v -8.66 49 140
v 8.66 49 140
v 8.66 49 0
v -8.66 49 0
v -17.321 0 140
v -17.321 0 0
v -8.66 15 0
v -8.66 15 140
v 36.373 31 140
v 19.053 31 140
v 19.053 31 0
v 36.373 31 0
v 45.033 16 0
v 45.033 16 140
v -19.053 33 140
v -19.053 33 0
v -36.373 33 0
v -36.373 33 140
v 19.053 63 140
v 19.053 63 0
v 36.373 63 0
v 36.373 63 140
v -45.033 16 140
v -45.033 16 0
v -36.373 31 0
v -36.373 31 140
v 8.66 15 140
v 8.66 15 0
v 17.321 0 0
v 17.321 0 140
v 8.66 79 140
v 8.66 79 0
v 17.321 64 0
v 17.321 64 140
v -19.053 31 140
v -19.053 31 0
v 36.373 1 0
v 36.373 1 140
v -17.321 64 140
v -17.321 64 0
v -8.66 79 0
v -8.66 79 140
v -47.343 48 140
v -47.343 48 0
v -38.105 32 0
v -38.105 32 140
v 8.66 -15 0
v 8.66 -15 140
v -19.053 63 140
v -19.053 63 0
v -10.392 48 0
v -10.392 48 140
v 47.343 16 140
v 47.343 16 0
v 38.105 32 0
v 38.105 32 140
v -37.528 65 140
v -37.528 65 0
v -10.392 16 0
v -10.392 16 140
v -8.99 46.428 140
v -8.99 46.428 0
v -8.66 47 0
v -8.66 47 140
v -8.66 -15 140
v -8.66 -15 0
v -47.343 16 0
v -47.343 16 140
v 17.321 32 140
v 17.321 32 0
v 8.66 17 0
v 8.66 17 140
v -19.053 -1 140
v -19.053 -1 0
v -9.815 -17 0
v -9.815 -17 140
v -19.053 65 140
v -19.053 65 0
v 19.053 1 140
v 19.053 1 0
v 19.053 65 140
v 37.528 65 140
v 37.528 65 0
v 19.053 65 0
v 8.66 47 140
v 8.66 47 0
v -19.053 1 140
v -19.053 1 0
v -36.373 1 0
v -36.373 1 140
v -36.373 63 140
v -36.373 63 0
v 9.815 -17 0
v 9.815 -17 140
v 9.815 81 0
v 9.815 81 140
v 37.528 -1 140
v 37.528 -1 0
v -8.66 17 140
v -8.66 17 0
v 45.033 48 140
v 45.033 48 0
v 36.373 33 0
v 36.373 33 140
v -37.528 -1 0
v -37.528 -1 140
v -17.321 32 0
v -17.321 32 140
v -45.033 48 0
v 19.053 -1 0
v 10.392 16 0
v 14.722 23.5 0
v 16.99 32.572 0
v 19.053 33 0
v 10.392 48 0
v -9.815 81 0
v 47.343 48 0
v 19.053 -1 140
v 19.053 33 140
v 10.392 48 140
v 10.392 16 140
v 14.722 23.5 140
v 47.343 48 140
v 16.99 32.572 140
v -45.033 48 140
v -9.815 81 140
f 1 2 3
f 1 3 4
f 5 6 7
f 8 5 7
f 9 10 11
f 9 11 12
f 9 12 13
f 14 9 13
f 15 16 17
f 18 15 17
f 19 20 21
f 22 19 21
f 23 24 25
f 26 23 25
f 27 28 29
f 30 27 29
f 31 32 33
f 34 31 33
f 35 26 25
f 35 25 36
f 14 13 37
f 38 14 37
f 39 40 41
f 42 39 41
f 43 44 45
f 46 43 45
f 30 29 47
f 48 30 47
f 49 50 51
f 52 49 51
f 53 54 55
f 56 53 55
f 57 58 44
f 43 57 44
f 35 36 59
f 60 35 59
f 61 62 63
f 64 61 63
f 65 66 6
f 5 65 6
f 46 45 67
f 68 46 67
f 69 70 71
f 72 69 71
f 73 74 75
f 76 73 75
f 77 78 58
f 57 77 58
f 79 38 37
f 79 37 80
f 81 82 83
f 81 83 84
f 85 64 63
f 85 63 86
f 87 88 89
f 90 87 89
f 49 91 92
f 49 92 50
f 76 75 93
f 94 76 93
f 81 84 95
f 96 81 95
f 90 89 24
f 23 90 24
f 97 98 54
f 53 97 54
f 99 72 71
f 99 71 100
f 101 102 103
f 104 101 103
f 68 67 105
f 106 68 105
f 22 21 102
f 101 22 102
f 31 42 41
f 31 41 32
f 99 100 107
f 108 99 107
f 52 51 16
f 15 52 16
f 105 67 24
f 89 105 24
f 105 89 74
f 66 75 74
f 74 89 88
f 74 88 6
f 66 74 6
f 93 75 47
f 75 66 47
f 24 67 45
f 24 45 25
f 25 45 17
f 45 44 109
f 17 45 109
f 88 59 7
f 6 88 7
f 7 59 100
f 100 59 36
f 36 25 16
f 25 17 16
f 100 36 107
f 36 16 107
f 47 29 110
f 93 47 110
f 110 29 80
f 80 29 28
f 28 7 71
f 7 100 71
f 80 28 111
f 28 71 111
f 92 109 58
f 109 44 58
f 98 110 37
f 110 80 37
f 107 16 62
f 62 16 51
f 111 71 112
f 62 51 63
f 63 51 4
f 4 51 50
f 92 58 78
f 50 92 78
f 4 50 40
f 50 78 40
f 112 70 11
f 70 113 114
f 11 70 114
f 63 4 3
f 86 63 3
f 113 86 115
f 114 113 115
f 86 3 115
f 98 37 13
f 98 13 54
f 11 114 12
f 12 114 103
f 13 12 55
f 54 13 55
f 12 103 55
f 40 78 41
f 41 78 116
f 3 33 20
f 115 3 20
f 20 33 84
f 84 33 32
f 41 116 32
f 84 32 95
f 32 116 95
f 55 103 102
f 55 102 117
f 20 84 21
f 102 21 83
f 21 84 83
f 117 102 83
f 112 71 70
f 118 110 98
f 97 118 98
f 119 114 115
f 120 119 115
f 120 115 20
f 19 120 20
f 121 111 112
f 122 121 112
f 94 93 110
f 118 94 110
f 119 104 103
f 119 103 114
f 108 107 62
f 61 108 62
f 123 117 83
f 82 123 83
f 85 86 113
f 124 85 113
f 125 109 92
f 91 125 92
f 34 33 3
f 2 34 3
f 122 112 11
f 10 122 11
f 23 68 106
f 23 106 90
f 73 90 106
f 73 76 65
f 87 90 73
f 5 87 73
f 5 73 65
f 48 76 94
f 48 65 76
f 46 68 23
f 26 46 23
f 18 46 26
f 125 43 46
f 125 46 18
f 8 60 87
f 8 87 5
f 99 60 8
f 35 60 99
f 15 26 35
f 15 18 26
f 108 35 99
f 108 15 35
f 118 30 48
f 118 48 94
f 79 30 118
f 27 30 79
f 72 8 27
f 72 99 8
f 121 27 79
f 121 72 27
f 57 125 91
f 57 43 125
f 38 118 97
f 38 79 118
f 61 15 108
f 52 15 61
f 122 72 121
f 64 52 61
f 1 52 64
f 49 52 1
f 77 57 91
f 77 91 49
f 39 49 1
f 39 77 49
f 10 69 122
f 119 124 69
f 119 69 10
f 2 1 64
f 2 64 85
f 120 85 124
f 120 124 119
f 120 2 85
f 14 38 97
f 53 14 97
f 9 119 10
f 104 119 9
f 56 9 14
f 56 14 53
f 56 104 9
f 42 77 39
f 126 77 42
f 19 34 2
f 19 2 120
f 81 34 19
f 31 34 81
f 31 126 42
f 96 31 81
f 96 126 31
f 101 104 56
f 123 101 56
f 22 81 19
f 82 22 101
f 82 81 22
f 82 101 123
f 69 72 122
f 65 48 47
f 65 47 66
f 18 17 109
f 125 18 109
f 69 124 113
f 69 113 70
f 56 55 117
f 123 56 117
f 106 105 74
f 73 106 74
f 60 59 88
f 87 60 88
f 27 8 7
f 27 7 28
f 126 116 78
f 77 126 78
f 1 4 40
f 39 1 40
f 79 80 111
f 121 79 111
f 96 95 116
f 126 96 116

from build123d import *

# Parameters (mm, degrees)
F1_DEPTH = 140


# Not quite as in the source:
# - ends of sketch curves that miss each other by under 0.0002 mm in the source are joined


with BuildPart() as f1:
    # F0 (on Top) → F1 (new body)
    with BuildSketch(Plane.XY):
        Polygon((9.8149545762, -17), (19.0525588833, -1), (37.5277626519, -1), (47.3427172281, 16), (38.1051129211, 32), (47.3427172281, 48), (37.5277626519, 65), (19.0525576719, 65), (9.8149545762, 81), (-9.8149545762, 81), (-19.0525576719, 65.0000020981), (-37.5277626519, 65), (-47.3427172281, 48), (-38.1051129211, 32), (-47.3427172281, 16), (-37.5277626519, -1), (-19.0525588833, -1), (-9.8149545762, -17), align=None)
        Polygon((-10.3923048454, 16), (-19.0525576719, 1.0000020981), (-36.3730621135, 1), (-45.0333161514, 16), (-36.3730621135, 31), (-19.0525540378, 31), align=None, mode=Mode.SUBTRACT)
        Polygon((-17.3205080757, 0), (-8.6602540378, 15), (8.6602540378, 15), (17.3205080757, 0), (8.6602540378, -15), (-8.6602540378, -15), align=None, mode=Mode.SUBTRACT)
        Polygon((8.6602540378, 17), (-8.6602540378, 17), (-17.3205080757, 32), (-8.9903810568, 46.4282032303), (-8.6602540378, 47), (8.6602540378, 47), (16.9903849907, 32.5717899559), (17.3205080757, 32), align=None, mode=Mode.SUBTRACT)
        Polygon((19.0525576719, 1.0000020981), (10.3923048454, 16), (14.7224318643, 23.5), (19.0525540378, 31), (36.3730621135, 31), (45.0333161514, 16), (36.3730621135, 1), align=None, mode=Mode.SUBTRACT)
        Polygon((-10.3923048454, 48), (-19.0525576719, 33.0000020981), (-36.3730621135, 33), (-45.0333161514, 48), (-36.3730621135, 63), (-19.0525540378, 63), align=None, mode=Mode.SUBTRACT)
        Polygon((19.0525576719, 33.0000020981), (10.3923048454, 48), (19.0525576719, 62.9999979019), (36.3730621135, 63), (45.0333161514, 48), (36.3730621135, 33), align=None, mode=Mode.SUBTRACT)
        Polygon((8.6602540378, 49), (-8.6602540378, 49), (-17.3205080757, 64), (-8.6602540378, 79), (8.6602540378, 79), (17.3205080757, 64), align=None, mode=Mode.SUBTRACT)
    extrude(amount=F1_DEPTH)


solid = f1.part
